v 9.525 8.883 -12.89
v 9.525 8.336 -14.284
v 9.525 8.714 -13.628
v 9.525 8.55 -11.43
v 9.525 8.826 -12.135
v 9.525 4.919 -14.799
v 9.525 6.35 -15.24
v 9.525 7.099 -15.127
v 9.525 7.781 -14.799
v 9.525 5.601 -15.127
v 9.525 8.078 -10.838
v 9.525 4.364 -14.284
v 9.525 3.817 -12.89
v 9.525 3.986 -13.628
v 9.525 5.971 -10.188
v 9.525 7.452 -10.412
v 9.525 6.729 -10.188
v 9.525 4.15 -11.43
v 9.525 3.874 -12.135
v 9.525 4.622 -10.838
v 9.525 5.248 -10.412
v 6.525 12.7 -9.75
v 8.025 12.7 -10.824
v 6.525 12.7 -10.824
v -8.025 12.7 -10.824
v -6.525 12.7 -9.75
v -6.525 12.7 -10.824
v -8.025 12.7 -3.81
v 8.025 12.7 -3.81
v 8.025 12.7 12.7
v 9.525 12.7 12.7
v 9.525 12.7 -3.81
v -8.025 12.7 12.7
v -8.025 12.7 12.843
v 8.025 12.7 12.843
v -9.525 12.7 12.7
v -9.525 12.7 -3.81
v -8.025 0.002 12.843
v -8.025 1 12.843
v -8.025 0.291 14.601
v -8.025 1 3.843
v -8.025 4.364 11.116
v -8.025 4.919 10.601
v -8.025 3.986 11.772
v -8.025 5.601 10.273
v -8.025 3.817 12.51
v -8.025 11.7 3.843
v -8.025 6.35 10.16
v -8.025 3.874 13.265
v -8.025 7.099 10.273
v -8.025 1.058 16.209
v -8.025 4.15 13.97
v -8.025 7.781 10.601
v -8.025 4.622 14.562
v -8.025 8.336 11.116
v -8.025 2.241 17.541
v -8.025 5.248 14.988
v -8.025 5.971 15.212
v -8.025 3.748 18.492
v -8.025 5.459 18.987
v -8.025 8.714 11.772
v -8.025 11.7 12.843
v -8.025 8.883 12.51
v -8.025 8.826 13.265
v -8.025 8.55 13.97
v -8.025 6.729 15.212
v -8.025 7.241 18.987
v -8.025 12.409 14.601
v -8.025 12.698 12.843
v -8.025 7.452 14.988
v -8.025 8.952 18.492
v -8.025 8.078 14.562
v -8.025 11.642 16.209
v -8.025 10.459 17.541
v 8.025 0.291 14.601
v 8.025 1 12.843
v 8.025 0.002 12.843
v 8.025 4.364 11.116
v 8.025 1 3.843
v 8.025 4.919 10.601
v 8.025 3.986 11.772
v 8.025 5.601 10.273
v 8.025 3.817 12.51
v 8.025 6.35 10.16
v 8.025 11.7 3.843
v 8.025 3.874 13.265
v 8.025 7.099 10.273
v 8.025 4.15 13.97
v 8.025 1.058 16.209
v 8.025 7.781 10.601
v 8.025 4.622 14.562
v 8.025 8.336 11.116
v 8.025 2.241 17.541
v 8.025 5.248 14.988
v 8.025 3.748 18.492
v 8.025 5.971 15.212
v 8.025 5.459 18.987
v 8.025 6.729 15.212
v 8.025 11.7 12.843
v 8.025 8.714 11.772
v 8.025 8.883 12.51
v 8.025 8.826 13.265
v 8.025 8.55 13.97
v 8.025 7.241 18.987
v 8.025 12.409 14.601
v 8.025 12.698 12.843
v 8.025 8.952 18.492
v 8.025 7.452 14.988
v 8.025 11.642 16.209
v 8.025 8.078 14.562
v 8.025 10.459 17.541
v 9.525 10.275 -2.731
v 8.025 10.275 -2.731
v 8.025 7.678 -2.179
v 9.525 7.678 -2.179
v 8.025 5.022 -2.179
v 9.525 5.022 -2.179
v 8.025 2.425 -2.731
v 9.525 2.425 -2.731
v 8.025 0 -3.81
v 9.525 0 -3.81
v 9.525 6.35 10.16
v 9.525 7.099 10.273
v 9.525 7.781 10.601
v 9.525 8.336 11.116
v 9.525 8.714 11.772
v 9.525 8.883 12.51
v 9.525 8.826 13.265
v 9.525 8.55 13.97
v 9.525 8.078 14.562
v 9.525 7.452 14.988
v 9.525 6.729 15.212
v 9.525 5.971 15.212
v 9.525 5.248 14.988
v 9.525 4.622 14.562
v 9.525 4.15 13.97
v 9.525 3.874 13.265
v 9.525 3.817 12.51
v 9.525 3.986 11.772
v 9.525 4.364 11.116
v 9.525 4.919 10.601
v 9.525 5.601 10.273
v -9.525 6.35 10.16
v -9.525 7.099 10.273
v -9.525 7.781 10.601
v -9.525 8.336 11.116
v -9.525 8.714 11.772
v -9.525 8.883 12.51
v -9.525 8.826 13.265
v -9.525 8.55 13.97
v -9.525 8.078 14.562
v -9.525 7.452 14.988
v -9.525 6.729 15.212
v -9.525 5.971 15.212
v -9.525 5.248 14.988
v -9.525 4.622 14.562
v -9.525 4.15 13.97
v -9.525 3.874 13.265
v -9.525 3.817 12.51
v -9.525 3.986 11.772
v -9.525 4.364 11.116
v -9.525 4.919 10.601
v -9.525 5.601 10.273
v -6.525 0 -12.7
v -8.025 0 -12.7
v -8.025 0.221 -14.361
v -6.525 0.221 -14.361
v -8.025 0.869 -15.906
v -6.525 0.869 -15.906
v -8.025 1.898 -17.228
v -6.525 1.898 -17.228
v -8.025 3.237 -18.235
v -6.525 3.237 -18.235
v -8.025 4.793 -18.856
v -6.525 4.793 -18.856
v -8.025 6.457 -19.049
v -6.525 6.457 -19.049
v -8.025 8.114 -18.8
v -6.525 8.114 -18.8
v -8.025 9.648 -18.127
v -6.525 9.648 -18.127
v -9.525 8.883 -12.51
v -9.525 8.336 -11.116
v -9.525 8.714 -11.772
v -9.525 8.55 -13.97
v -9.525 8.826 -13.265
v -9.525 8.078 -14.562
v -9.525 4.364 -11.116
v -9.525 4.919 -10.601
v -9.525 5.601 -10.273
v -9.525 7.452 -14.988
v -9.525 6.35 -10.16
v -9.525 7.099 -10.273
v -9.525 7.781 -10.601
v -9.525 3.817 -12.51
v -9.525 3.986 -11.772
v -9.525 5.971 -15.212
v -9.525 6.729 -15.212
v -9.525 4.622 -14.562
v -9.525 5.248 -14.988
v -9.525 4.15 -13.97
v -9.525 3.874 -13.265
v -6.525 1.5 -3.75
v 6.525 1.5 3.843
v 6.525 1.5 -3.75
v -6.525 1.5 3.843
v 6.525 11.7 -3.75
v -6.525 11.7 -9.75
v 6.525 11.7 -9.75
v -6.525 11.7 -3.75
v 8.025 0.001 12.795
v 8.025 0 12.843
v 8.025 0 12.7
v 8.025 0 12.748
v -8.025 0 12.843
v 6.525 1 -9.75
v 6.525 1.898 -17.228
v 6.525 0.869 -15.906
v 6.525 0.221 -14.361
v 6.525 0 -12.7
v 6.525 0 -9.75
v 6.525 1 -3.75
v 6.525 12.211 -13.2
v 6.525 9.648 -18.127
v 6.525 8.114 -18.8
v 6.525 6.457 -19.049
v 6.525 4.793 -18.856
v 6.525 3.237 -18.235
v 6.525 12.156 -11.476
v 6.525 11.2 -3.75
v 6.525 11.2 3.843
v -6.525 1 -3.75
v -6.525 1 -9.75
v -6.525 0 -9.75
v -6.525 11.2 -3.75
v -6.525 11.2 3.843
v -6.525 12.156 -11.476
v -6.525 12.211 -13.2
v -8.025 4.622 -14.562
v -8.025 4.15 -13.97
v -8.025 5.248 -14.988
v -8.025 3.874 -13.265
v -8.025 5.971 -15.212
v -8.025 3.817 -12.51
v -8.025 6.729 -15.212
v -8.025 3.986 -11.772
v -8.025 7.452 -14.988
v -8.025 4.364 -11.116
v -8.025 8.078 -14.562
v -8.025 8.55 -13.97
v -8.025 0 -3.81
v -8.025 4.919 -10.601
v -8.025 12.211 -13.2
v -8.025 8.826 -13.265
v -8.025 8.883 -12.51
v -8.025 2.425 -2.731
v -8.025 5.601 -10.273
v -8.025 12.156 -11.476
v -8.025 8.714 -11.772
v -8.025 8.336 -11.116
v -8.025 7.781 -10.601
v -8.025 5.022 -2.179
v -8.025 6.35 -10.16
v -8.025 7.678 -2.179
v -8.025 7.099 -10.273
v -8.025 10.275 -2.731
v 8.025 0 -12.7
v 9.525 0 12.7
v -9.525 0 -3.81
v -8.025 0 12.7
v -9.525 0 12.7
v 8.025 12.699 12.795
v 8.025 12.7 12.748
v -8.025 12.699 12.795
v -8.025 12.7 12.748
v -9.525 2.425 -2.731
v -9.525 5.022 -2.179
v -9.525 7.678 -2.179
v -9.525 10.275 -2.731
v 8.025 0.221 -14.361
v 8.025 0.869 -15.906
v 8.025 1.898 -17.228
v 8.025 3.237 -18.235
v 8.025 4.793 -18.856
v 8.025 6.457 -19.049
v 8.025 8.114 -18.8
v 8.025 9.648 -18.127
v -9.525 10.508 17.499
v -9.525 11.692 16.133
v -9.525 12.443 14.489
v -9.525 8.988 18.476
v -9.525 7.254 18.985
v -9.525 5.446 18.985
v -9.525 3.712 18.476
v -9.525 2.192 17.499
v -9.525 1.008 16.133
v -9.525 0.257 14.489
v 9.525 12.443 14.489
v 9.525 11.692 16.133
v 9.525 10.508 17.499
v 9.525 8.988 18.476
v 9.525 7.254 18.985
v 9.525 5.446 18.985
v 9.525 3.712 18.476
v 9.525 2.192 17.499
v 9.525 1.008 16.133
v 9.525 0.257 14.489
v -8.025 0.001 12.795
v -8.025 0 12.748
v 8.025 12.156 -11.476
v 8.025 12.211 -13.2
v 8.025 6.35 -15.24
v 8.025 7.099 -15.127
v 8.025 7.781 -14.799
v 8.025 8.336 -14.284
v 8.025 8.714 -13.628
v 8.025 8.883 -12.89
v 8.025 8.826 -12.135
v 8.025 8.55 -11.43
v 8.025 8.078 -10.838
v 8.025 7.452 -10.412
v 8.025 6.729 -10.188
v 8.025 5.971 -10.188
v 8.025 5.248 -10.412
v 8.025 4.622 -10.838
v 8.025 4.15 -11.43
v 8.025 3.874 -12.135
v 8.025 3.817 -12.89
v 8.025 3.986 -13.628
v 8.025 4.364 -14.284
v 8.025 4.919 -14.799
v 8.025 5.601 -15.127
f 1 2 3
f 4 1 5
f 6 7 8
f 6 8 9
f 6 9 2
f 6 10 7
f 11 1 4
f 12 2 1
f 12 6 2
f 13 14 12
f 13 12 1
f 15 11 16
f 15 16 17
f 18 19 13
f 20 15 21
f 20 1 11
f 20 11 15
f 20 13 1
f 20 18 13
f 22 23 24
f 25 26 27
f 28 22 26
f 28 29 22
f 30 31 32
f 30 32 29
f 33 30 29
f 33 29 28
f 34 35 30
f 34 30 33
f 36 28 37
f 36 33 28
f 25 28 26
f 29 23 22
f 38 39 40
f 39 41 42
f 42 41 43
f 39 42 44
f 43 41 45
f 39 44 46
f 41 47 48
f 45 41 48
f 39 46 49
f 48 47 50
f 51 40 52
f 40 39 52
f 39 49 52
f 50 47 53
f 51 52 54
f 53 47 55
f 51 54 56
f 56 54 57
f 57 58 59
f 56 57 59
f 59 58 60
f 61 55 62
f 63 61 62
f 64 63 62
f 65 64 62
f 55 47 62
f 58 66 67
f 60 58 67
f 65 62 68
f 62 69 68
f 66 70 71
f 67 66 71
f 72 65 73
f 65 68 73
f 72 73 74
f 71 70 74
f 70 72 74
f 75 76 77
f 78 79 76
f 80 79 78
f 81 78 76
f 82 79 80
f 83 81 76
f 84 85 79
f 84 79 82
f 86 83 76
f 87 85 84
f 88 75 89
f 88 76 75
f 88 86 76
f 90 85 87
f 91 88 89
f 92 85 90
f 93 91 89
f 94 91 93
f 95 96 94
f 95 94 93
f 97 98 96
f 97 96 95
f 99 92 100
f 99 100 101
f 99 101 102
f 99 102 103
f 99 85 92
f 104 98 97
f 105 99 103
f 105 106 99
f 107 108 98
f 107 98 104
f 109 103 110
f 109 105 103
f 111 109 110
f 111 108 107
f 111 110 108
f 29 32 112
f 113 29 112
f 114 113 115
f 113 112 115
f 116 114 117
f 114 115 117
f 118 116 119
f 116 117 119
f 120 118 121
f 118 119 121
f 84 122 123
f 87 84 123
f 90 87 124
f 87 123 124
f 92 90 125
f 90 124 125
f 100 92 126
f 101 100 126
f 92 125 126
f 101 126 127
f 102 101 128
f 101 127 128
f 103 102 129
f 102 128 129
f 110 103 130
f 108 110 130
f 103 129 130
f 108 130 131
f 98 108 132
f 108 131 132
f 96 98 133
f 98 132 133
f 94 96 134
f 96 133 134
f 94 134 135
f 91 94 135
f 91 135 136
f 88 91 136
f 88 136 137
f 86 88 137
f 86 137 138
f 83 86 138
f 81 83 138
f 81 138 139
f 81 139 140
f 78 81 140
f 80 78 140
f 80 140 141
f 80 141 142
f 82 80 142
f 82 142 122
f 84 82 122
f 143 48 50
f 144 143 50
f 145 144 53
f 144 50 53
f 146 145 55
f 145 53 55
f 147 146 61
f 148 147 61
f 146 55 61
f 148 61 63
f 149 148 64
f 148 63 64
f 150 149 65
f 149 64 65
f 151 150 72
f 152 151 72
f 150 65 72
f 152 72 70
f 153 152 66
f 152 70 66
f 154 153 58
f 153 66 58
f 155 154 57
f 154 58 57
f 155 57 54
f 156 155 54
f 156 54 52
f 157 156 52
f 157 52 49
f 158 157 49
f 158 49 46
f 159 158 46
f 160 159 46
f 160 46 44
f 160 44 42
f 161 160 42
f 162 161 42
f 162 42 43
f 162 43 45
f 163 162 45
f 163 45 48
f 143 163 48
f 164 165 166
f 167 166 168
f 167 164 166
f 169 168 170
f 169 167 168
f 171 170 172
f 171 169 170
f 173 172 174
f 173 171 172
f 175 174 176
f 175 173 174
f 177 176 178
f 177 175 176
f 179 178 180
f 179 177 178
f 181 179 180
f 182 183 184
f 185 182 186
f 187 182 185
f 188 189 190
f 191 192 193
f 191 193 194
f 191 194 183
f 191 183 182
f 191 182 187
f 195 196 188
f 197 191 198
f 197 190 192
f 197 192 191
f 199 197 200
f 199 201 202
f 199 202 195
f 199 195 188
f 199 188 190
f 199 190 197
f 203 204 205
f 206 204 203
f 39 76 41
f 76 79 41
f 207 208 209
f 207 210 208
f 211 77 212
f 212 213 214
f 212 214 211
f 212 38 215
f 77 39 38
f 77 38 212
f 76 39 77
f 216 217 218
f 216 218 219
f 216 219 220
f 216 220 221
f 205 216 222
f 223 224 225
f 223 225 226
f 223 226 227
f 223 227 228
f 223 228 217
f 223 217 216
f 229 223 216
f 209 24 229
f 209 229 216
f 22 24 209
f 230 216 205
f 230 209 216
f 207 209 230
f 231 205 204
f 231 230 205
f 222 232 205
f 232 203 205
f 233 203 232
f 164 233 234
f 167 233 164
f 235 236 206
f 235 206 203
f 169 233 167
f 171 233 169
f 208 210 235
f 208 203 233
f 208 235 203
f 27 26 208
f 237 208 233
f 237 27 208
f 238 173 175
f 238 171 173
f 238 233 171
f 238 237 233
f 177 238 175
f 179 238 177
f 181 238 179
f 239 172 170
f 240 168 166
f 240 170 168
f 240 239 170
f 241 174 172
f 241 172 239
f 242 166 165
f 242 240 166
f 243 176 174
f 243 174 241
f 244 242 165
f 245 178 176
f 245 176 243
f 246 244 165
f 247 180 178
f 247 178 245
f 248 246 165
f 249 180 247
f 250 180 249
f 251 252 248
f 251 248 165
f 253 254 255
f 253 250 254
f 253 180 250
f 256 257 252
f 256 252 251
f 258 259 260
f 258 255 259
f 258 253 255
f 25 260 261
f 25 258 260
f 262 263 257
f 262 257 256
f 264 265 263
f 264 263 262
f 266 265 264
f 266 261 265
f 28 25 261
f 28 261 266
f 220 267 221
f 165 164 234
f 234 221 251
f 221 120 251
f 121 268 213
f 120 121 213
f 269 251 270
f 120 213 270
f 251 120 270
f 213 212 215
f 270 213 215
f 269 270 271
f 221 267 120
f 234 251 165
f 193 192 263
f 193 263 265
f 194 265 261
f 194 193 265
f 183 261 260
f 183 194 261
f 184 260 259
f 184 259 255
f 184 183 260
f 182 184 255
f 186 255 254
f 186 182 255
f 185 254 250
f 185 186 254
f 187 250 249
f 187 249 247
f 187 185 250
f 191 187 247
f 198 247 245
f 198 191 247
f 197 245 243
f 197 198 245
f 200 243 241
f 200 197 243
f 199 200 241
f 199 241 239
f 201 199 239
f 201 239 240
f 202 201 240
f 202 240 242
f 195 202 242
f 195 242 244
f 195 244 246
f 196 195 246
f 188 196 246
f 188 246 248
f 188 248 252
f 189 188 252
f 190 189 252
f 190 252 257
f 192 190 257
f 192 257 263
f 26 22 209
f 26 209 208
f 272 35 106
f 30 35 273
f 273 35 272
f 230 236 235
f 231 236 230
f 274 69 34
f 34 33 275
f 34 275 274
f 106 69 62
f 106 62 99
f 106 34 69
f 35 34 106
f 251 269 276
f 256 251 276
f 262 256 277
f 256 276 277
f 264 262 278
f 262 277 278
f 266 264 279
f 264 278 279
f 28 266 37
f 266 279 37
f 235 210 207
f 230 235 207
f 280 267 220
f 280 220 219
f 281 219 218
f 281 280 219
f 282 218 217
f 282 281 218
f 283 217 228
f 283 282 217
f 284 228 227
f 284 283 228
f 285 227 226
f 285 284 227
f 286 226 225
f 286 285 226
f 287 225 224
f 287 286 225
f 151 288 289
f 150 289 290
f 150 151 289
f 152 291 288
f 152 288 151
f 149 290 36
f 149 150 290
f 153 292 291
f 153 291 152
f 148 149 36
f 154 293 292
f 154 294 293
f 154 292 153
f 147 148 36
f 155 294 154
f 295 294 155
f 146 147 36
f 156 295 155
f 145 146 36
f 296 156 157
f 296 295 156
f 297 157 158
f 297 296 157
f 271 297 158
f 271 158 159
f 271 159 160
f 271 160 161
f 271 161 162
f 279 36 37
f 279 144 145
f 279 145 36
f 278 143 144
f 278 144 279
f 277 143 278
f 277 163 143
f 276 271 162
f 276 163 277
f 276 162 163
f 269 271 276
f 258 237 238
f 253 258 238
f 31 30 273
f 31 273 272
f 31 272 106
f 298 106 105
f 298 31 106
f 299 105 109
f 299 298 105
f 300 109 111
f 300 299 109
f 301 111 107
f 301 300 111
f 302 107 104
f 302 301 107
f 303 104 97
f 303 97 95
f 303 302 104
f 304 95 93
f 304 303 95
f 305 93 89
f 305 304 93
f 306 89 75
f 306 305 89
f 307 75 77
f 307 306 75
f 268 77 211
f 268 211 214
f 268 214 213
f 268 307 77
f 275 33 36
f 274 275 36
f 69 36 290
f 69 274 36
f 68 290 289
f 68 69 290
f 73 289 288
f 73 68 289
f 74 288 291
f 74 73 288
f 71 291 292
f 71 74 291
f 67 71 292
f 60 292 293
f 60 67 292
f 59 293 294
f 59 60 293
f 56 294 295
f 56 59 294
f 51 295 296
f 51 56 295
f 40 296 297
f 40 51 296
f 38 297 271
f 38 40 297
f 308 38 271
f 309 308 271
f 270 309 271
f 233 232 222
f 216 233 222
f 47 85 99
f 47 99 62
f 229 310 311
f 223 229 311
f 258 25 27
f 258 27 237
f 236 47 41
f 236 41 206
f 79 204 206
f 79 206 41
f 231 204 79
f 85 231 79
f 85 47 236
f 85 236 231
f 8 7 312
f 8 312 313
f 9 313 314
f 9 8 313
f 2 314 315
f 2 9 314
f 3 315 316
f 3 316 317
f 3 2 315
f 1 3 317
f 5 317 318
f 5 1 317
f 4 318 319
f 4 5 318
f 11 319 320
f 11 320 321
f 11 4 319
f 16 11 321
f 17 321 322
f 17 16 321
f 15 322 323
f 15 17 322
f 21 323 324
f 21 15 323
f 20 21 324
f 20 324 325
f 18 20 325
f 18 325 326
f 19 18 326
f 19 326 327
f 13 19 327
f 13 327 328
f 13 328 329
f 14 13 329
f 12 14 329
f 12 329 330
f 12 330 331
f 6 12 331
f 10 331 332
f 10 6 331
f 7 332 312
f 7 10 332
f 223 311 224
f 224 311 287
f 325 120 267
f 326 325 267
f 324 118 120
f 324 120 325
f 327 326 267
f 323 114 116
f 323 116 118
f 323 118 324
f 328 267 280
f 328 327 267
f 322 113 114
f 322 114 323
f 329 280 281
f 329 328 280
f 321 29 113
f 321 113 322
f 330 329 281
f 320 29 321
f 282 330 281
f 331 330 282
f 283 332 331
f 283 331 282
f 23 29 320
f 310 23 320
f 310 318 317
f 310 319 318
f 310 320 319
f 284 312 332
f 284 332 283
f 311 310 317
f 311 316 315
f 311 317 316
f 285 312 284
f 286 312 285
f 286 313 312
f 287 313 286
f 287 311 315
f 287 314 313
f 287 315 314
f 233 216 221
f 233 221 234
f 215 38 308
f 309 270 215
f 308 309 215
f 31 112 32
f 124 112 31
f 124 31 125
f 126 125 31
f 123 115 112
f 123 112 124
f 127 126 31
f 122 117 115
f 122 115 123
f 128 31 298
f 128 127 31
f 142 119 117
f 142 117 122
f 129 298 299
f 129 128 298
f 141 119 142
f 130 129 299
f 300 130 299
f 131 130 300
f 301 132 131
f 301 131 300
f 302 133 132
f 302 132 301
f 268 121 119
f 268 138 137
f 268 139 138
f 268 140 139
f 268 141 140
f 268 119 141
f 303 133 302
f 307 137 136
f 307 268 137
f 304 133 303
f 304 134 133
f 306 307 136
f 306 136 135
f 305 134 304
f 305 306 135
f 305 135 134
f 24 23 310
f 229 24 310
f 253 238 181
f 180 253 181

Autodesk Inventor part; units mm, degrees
ref_plane "YZ Plane" through (0, 0, 0) normal (1, 0, 0) x (0, 1, 0)
ref_plane "XZ Plane" through (0, 0, 0) normal (0, 1, 0) x (-1, 0, 0)
ref_plane "XY Plane" through (0, 0, 0) normal (0, 0, 1) x (1, 0, 0)
sketch "Boceto1" plane through (0, 0, 0) normal (0, 1, 0) x (-1, 0, 0)
  line L0 (-9.525, 19.05) -> (9.525, 19.05)
  line L1 (9.525, 19.05) -> (9.525, -19.05)
  line L2 (9.525, -19.05) -> (-9.525, -19.05)
  line L3 (-9.525, -19.05) -> (-9.525, 19.05)
  line L4 (-9.525, 19.05) -> (9.525, -19.05) construction
  line L5 (9.525, 19.05) -> (-9.525, -19.05) construction
  point P0 (0, 0)
  dimension "d0" = 19.05
  dimension "d1" = 38.1
extrude "Extrusión1" add sketch "Boceto1" along normal blind 12.7
sketch "Boceto3" plane through (9.525, 0, 19.05) normal (1, 0, 0) x (0, 0, -1)
  line L0 (38.1, 0) -> (38.1, 12.7)
  line L1 (38.1, 6.35) -> (38.1, 6.35)
  line L2 (0, 6.35) -> (0, 6.35)
  arc A0 (6.35, 12.7) -> (0, 6.35) centre (6.35, 6.35) ccw
  arc A1 (0, 6.35) -> (6.35, 0) centre (6.35, 6.35) ccw
  arc A2 (38.1, 6.35) -> (31.75, 12.7) centre (31.75, 6.35) ccw
  arc A3 (31.75, 0) -> (38.1, 6.35) centre (31.75, 6.35) ccw
  line L3 (0, 0) -> (0, 12.7)
  line L4 (38.1, 0) -> (31.75, 0)
  line L5 (6.35, 0) -> (0, 0)
  line L6 (0, 12.7) -> (6.35, 12.7)
  line L7 (31.75, 12.7) -> (38.1, 12.7)
  point P0 (19.05, 0)
  point P1 (0, 6.35)
  dimension "d7" = 6.35
extrude "Extrusión3" cut sketch "Boceto3" against normal up to surface (19.05 mm away)
sketch "Boceto5" plane through (0, 12.7, 0) normal (0, 1, 0) x (1, 0, 0)
  line L0 (-9.525, 19.05) -> (-9.525, -19.05) projected
  line L1 (9.525, -12.7) -> (9.525, 12.7) projected
  line L2 (9.525, -19.05) -> (9.525, -12.7) projected
  line L3 (-8.025, -3.843) -> (-8.025, -19.05)
  line L4 (8.025, -3.843) -> (8.025, -12.7)
  line L5 (8.025, -12.7) -> (8.025, -19.05)
  line L6 (-8.025, -3.843) -> (8.025, -3.843)
  line L7 (-8.025, -19.05) -> (8.025, -19.05)
  line L8 (-9.525, -19.05) -> (9.525, -19.05) projected
  point P0 (0, 0)
  dimension "d11" = 1.5
  dimension "d12" = 1.5
extrude "Extrusión4" cut sketch "Boceto5" against normal up to surface (12.7 mm away)
sketch "Boceto6" plane through (9.525, 0, 12.7) normal (1, 0, 0) x (0, 0, -1)
  arc A0 (0, 12.7) -> (0, 0) centre (0, 6.35) ccw projected
  circle A1 centre (0, 6.35) radius 2.54
  point P0 (12.7, 0)
  dimension "d15" = 5.08
extrude "Extrusión5" cut sketch "Boceto6" against normal up to surface (19.05 mm away)
sketch "Boceto7" plane through (9.525, 0, 12.7) normal (1, 0, 0) x (0, 0, -1)
  line L0 (0, 12.7) -> (25.4, 12.7) projected
  arc A0 (16.5105, 12.7) -> (16.5105, 0) centre (27.5091, 6.35) ccw
  line L1 (16.5105, 12.7) -> (35.1863, 12.7)
  line L2 (35.1863, 12.7) -> (35.1863, 0)
  line L3 (35.1863, 0) -> (16.5105, 0)
  circle A1 centre (25.4, 6.35) radius 2.54
  point P0 (12.7, 0)
  dimension "d18" = 12.7
  dimension "d19" = 5.08
extrude "Extrusión6" cut sketch "Boceto7" against normal blind 1.5
sketch "Boceto8" plane through (-9.525, 0, -12.7) normal (-1, 0, 0) x (0, 0, 1)
  arc A0 (8.8895, 0) -> (8.8895, 12.7) centre (-2.1091, 6.35) ccw projected
  line L0 (-6.35, 12.7) -> (31.75, 12.7) projected
  line L1 (0, 0) -> (25.4, 0) projected
  circle A1 centre (0, 6.35) radius 2.54 projected
  line L2 (0, 0) -> (-7.3331, 0)
  line L3 (-7.3331, 0) -> (-7.3331, 12.7)
  line L4 (-7.3331, 12.7) -> (-6.35, 12.7)
  point P0 (12.7, 0)
extrude "Extrusión7" cut sketch "Boceto8" against normal blind 1.5
sketch "Boceto9" plane through (-8.025, 12.7, 3.843) normal (0, 0, 1) x (1, 0, 0)
  line L0 (16.05, -12.7) -> (0, -12.7) projected
  line L1 (16.05, 0) -> (16.05, -12.7) projected
  line L2 (0, 0) -> (16.05, 0) projected
  line L3 (0, 0) -> (0, -12.7) projected
  line L4 (14.55, -1.5) -> (14.55, -11.2)
  line L5 (14.55, -11.2) -> (1.5, -11.2)
  line L6 (1.5, -11.2) -> (1.5, -1.5)
  line L7 (1.5, -1.5) -> (14.55, -1.5)
  point P0 (8.025, -12.7)
  dimension "d24" = 1.5
extrude "Extrusión8" cut sketch "Boceto9" against normal blind 25 contours L4 L5 L6 L7
sketch "Boceto10" plane through (0, 12.7, 0) normal (0, 1, 0) x (1, 0, 0)
  line L0 (6.525, 16.7988) -> (-6.525, 16.7988) projected
  line L1 (6.525, 16.7988) -> (6.525, 3.7495)
  line L2 (6.525, -3.843) -> (6.525, 16.7988) projected
  line L3 (-6.525, -3.843) -> (-6.525, 16.7988) projected
  line L4 (-6.525, 3.7495) -> (-6.525, 16.7988)
  line L5 (-6.525, 16.7988) -> (6.525, 16.7988)
  line L6 (-6.525, 3.7495) -> (6.525, 3.7495)
  point P0 (0, 0)
extrude "Extrusión9" cut sketch "Boceto10" against normal up to surface (12.7 mm away)
sketch "Boceto12" plane through (-8.025, 12.7, 3.843) normal (0, 0, 1) x (1, 0, 0)
  line L0 (0, 0) -> (-1.5, 0) projected
  line L1 (16.05, 0) -> (16.05, -12.7) projected
  line L2 (0, 0) -> (16.05, 0)
  line L3 (16.05, 0) -> (16.05, -1)
  line L4 (16.05, -1) -> (0, -1)
  line L5 (0, -1) -> (0, 0)
  line L6 (16.05, -12.7) -> (0, -12.7) projected
  line L7 (0, -12.7) -> (16.05, -12.7)
  line L8 (16.05, -12.7) -> (16.05, -11.7)
  line L9 (16.05, -11.7) -> (0, -11.7)
  line L10 (0, -11.7) -> (0, -12.7)
  point P0 (8.025, -12.7)
  dimension "d29" = 1
  dimension "d30" = 1
extrude "Extrusión10" add sketch "Boceto12" along normal blind 9
sketch "Boceto13" plane through (8.025, 0, 12.7) normal (1, 0, 0) x (0, 0, -1)
  line L0 (16.5105, 12.7) -> (25.4, 12.7) projected
  line L1 (23.5239, 12.7) -> (24.1756, 12.1558)
  line L2 (24.1756, 12.1558) -> (25.9001, 12.2114)
  line L3 (25.9001, 12.2114) -> (30.8267, 9.6476)
  arc A0 (25.4, 0) -> (25.4, 12.7) centre (25.4, 6.35) ccw projected
  line L4 (23.5239, 12.7) -> (30.4855, 12.7)
  line L5 (30.4855, 12.7) -> (30.8267, 9.6476)
  point P0 (12.7, 0)
extrude "Extrusión11" cut sketch "Boceto13" against normal up to surface (16.05 mm away)
sketch "Boceto14" plane through (6.525, 12.7, -3.7495) normal (0, 0, -1) x (-1, 0, 0)
  line L0 (0, 0) -> (0, -1.5) projected
  line L1 (13.05, 0) -> (13.05, -1.5) projected
  line L2 (0, 0) -> (13.05, 0)
  line L3 (13.05, 0) -> (13.05, -1)
  line L4 (13.05, -1) -> (0, -1)
  line L5 (0, -1) -> (0, 0)
  line L6 (0, -11.2) -> (0, -12.7) projected
  line L7 (13.05, -11.2) -> (13.05, -12.7) projected
  line L8 (0, -12.7) -> (13.05, -12.7)
  line L9 (13.05, -12.7) -> (13.05, -11.7)
  line L10 (13.05, -11.7) -> (0, -11.7)
  line L11 (0, -11.7) -> (0, -12.7)
  point P0 (6.525, -12.7)
  point P1 (0, -1)
  dimension "d35" = 1
  dimension "d36" = 1
extrude "Extrusión12" add sketch "Boceto14" along normal blind 6
properties part number "cadena_link" material "Plástico PC/ABS"
